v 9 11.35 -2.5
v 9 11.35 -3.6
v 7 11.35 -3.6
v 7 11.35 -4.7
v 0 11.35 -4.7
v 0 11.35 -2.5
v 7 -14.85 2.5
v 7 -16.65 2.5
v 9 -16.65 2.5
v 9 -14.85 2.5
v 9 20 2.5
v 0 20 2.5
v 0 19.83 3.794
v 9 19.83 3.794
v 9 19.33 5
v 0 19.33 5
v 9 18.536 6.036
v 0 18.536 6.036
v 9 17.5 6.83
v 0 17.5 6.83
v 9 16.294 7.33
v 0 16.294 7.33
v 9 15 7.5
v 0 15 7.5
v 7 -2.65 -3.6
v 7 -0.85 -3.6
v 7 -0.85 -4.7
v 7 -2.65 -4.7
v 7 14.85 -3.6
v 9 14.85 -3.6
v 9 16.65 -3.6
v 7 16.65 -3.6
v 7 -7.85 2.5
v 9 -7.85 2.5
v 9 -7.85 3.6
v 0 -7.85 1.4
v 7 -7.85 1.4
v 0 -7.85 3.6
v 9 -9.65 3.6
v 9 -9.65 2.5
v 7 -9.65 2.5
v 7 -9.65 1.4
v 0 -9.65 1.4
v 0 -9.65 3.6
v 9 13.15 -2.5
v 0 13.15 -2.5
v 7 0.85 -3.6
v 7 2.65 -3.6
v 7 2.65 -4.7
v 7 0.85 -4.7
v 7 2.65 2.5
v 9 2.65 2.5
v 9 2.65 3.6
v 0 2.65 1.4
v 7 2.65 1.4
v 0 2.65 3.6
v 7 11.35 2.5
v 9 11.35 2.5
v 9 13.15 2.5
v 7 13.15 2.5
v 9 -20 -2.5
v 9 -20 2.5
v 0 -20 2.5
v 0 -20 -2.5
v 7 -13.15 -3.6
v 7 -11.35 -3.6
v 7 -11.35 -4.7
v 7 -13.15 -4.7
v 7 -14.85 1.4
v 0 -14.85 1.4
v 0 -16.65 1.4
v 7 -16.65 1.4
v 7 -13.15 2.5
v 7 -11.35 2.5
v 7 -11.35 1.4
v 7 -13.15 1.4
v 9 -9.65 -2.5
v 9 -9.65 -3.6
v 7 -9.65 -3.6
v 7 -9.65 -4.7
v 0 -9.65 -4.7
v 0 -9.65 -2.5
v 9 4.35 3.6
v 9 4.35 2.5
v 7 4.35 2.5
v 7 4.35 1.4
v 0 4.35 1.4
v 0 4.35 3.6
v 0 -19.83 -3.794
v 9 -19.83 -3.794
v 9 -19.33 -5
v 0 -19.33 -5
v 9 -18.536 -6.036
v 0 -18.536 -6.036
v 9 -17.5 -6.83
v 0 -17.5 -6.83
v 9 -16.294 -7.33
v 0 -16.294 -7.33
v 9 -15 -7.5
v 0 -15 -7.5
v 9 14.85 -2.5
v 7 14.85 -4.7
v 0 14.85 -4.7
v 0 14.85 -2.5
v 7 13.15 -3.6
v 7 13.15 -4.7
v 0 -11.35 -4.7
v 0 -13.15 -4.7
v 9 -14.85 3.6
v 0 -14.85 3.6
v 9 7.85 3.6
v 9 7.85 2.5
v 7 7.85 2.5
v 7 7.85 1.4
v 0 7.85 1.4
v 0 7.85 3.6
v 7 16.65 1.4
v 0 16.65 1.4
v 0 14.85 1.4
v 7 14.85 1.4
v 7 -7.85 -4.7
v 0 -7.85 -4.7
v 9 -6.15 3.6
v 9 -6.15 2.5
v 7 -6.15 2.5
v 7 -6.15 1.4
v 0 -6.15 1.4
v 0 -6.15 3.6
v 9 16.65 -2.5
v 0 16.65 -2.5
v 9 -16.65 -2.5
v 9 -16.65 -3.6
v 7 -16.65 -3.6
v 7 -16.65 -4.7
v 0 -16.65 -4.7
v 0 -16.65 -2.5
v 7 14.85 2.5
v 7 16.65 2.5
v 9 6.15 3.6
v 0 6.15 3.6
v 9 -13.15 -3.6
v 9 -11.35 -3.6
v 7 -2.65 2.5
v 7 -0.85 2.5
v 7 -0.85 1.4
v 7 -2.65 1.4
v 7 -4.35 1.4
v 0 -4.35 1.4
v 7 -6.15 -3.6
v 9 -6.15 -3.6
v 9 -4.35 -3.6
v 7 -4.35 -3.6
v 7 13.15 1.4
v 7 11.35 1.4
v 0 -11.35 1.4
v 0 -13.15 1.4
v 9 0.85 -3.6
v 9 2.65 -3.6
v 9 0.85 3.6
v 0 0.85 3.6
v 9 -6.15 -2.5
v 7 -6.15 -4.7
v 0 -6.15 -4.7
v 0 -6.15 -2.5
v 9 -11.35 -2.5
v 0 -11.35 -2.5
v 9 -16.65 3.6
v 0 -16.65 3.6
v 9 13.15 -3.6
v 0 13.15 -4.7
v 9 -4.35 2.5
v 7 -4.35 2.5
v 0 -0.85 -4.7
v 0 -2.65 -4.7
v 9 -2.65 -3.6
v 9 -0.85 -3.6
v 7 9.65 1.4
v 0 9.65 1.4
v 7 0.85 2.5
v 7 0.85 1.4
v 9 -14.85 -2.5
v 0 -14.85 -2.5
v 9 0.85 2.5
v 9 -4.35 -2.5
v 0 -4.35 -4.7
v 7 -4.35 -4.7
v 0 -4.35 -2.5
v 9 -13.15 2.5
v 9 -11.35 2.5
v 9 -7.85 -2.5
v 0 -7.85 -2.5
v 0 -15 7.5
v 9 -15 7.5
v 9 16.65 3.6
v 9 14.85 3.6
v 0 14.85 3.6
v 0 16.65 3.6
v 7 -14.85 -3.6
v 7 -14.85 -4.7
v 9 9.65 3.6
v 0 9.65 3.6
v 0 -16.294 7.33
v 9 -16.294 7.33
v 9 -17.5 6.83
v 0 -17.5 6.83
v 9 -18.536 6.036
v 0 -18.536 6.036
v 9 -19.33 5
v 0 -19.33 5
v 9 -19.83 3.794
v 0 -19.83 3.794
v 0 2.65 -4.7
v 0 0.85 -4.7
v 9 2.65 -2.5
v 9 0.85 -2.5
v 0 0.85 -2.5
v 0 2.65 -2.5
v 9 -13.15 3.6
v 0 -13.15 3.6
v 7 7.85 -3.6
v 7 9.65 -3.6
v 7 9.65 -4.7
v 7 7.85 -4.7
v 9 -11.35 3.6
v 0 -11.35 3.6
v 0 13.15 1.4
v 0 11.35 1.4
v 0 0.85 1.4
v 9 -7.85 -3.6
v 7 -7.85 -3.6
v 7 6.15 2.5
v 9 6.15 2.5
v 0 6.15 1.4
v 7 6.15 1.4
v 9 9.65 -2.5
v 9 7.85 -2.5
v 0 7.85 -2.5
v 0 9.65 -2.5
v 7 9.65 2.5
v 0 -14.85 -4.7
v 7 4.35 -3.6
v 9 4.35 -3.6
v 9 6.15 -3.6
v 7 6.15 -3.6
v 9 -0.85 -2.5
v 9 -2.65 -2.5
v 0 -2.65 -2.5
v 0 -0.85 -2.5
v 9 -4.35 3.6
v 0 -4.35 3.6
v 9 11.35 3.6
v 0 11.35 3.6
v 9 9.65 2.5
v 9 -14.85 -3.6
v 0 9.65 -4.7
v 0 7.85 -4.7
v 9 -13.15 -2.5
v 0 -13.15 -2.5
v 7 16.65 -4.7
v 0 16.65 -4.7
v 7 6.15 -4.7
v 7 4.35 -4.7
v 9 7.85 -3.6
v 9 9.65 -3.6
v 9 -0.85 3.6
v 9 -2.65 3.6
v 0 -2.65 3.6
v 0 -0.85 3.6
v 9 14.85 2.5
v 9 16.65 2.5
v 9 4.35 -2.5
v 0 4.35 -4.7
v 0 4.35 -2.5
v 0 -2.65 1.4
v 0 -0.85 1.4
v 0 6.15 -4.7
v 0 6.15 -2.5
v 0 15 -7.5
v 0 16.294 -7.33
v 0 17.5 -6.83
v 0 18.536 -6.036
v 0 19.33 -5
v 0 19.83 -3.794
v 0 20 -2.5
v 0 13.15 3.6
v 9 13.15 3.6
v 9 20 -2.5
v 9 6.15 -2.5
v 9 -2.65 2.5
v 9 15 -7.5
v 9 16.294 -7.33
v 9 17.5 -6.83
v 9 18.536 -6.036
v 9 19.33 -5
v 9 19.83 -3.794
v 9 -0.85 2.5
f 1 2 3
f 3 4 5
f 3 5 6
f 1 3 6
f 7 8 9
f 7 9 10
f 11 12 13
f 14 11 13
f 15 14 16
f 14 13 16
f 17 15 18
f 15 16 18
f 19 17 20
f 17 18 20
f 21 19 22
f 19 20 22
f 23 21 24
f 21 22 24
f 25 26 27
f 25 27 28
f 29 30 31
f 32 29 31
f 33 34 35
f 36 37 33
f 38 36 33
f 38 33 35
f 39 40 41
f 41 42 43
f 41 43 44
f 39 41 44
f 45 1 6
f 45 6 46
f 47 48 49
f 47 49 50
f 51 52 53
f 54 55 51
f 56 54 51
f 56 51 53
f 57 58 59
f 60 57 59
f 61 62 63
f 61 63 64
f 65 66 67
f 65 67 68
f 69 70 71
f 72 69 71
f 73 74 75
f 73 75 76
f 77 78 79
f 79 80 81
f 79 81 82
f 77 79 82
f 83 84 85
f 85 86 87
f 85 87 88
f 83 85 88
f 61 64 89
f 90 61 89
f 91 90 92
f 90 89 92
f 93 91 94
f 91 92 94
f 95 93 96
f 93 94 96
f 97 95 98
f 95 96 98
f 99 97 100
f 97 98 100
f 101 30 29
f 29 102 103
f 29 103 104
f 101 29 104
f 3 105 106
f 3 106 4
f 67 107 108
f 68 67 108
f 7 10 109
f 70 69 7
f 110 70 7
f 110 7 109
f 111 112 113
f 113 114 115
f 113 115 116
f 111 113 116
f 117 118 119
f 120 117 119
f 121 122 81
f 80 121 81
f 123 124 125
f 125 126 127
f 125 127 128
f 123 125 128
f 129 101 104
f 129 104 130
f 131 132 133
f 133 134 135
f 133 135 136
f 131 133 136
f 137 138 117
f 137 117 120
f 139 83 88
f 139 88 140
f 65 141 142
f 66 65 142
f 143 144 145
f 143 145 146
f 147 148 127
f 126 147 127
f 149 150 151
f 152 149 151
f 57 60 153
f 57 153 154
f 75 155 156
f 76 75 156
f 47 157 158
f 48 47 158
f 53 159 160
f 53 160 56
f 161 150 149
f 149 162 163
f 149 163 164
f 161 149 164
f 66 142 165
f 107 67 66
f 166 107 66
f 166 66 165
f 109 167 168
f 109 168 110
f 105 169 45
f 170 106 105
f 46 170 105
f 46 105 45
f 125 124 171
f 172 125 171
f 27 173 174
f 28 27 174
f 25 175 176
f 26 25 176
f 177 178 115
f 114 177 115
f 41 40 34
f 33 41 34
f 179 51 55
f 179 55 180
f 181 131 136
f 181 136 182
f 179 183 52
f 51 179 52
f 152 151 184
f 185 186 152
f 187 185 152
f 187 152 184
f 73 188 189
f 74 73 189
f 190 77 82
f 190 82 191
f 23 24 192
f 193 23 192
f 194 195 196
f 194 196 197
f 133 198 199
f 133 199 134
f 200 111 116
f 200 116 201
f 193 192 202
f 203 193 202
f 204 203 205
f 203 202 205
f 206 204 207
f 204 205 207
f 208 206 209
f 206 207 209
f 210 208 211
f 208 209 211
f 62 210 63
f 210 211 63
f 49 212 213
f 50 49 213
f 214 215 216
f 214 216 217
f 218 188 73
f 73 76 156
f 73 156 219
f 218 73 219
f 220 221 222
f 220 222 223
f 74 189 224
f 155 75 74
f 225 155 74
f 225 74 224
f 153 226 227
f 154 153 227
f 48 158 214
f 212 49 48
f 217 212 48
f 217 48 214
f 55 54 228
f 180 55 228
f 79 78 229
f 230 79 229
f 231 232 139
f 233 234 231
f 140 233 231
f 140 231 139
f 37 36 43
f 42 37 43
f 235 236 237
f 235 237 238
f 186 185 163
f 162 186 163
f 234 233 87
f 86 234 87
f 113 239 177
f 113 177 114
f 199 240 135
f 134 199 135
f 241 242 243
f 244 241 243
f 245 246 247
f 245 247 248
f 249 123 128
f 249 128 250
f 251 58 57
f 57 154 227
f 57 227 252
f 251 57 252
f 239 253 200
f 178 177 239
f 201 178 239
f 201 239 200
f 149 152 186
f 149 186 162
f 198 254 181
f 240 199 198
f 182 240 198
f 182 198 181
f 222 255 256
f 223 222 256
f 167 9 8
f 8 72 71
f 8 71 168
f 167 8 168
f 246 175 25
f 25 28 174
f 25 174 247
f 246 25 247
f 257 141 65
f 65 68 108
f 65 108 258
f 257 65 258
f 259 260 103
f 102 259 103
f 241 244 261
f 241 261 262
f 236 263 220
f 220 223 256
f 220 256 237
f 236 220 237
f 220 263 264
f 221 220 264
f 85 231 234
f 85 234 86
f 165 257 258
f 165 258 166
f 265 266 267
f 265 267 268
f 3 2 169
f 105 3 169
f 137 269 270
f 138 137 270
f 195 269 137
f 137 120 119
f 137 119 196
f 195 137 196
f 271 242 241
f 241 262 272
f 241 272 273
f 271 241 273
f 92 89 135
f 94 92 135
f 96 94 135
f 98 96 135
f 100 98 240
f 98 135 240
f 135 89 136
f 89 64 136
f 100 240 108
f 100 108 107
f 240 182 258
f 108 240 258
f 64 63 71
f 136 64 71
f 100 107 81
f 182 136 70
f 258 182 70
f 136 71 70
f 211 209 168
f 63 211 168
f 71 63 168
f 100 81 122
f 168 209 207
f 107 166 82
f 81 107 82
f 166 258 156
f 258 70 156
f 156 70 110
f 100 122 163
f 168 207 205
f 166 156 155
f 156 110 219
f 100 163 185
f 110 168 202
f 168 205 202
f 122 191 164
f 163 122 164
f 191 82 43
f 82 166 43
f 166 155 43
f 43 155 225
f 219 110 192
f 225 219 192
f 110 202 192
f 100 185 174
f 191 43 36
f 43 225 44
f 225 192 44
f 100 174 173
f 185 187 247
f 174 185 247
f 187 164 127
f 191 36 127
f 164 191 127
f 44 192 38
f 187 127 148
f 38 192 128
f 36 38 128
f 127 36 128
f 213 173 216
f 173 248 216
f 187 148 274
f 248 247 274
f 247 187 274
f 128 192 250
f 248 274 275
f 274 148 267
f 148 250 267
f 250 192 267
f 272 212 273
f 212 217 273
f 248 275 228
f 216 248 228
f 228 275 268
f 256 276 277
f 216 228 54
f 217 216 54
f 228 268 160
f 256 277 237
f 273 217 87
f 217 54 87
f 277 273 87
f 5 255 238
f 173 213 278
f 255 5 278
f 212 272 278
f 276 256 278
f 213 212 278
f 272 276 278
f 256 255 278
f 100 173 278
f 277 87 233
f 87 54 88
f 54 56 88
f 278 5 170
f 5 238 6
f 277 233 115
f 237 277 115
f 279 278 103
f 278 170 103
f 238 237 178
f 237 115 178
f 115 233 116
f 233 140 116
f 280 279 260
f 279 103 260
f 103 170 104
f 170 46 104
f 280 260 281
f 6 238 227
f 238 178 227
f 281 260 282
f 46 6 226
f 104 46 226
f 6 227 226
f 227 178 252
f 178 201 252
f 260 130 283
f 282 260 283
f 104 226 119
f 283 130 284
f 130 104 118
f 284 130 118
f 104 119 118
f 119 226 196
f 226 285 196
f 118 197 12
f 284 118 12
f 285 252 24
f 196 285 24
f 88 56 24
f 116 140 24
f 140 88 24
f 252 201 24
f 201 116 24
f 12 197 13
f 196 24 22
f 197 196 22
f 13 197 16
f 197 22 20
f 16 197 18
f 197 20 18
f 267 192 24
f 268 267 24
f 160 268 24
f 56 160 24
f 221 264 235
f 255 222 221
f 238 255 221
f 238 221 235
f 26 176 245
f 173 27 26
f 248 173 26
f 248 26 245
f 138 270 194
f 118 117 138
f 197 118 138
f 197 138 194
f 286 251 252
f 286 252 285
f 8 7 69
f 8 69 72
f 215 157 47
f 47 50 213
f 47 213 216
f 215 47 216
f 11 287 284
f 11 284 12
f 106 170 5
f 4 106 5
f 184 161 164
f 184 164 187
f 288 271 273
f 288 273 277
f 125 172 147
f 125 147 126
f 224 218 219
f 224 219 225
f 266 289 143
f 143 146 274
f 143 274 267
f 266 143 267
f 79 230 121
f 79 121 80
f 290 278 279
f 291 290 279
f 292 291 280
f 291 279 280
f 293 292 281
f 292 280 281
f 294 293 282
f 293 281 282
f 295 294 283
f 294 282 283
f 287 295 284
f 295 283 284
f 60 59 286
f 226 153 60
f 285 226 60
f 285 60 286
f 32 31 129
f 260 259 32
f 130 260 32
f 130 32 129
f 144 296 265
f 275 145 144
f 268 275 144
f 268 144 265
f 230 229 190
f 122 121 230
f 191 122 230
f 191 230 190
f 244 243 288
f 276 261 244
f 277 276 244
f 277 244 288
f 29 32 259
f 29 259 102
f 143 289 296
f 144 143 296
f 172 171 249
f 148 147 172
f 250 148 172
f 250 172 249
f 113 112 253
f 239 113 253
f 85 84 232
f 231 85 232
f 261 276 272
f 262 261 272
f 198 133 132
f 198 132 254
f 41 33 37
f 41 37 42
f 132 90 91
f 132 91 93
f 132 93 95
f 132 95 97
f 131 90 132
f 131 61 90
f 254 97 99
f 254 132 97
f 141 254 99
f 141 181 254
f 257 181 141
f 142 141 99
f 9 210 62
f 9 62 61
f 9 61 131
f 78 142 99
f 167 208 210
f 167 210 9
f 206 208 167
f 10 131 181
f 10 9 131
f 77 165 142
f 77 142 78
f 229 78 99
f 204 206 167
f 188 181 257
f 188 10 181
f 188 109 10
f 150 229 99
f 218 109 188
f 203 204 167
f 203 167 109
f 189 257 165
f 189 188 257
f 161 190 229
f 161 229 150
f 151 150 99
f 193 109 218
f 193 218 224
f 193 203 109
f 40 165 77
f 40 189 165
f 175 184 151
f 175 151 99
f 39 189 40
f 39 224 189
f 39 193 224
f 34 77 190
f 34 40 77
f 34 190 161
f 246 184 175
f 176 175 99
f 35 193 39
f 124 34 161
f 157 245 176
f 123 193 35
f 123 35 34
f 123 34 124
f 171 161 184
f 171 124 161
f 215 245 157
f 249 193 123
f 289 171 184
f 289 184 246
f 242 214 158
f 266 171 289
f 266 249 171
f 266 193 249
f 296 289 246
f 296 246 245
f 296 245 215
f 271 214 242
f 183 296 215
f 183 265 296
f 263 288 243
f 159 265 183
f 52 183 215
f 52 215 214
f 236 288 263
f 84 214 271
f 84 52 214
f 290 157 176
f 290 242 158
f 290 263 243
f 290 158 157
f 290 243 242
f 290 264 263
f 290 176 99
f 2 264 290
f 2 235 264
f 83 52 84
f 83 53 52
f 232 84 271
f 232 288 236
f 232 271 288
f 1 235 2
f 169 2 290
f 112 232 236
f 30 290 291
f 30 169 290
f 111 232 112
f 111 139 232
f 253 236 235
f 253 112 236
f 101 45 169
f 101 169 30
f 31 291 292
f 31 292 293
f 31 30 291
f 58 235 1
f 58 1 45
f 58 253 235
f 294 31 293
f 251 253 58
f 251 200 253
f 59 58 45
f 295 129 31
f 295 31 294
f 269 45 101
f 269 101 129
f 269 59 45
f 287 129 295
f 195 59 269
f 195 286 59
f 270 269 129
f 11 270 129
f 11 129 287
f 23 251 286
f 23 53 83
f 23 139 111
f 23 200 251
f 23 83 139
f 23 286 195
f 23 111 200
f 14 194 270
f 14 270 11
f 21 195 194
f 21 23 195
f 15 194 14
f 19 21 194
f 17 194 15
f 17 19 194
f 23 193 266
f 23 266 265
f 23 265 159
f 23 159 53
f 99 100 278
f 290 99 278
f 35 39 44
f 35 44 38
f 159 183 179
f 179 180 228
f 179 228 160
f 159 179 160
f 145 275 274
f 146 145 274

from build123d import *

# Parameters (mm, degrees)
BOSS_EXTRUDE1_DEPTH = 9
SKETCH2_W           = 1.8
SKETCH2_H           = 1.1
CUT_EXTRUDE1_DEPTH  = 24.178653973
SKETCH3_W           = 1.8
SKETCH3_H           = 1.1
CUT_EXTRUDE2_DEPTH  = 7


with BuildPart() as part:
    # Sketch1 → Boss-Extrude1 (new body)
    with BuildSketch(Plane.YZ):
        with BuildLine():
            Line((-15, -7.5), (15, -7.5))
            ThreePointArc((15, -7.5), (18.535533906, -6.035533906), (20, -2.5))
            Line((20, -2.5), (20, 2.5))
            ThreePointArc((20, 2.5), (18.535533906, 6.035533906), (15, 7.5))
            Line((15, 7.5), (-15, 7.5))
            ThreePointArc((-15, 7.5), (-18.535533906, 6.035533906), (-20, 2.5))
            Line((-20, 2.5), (-20, -2.5))
            ThreePointArc((-20, -2.5), (-18.535533906, -6.035533906), (-15, -7.5))
        make_face()
    extrude(amount=BOSS_EXTRUDE1_DEPTH)

    # Sketch2 → Cut-Extrude1 (cut, through all)
    with BuildSketch(Plane.YZ.offset(9)):
        with Locations((-12.25, 3.05)):
            Rectangle(SKETCH2_W, SKETCH2_H)
        with Locations((-15.75, 3.05)):
            Rectangle(SKETCH2_W, SKETCH2_H)
        with Locations((-8.75, 3.05)):
            Rectangle(SKETCH2_W, SKETCH2_H)
        with Locations((-5.25, 3.05)):
            Rectangle(SKETCH2_W, SKETCH2_H)
        with Locations((-1.75, 3.05)):
            Rectangle(SKETCH2_W, SKETCH2_H)
        with Locations((1.75, 3.05)):
            Rectangle(SKETCH2_W, SKETCH2_H)
        with Locations((5.25, 3.05)):
            Rectangle(SKETCH2_W, SKETCH2_H)
        with Locations((8.75, 3.05)):
            Rectangle(SKETCH2_W, SKETCH2_H)
        with Locations((12.25, 3.05)):
            Rectangle(SKETCH2_W, SKETCH2_H)
        with Locations((15.75, 3.05)):
            Rectangle(SKETCH2_W, SKETCH2_H)
        with Locations((-12.25, -3.05)):
            Rectangle(SKETCH2_W, SKETCH2_H)
        with Locations((-8.75, -3.05)):
            Rectangle(SKETCH2_W, SKETCH2_H)
        with Locations((-5.25, -3.05)):
            Rectangle(SKETCH2_W, SKETCH2_H)
        with Locations((-1.75, -3.05)):
            Rectangle(SKETCH2_W, SKETCH2_H)
        with Locations((1.75, -3.05)):
            Rectangle(SKETCH2_W, SKETCH2_H)
        with Locations((5.25, -3.05)):
            Rectangle(SKETCH2_W, SKETCH2_H)
        with Locations((8.75, -3.05)):
            Rectangle(SKETCH2_W, SKETCH2_H)
        with Locations((12.25, -3.05)):
            Rectangle(SKETCH2_W, SKETCH2_H)
        with Locations((15.75, -3.05)):
            Rectangle(SKETCH2_W, SKETCH2_H)
        with Locations((-15.75, -3.05)):
            Rectangle(SKETCH2_W, SKETCH2_H)
    extrude(amount=-CUT_EXTRUDE1_DEPTH, mode=Mode.SUBTRACT)

    # Sketch3 → Cut-Extrude2 (cut)
    with BuildSketch(Plane(origin=(0, 0, 0), x_dir=(0, -1, 0), z_dir=(-1, 0, 0))):
        with Locations((-15.75, 1.95)):
            Rectangle(SKETCH3_W, SKETCH3_H)
        with Locations((-12.25, 1.95)):
            Rectangle(SKETCH3_W, SKETCH3_H)
        with Locations((-8.75, 1.95)):
            Rectangle(SKETCH3_W, SKETCH3_H)
        with Locations((-5.25, 1.95)):
            Rectangle(SKETCH3_W, SKETCH3_H)
        with Locations((-1.75, 1.95)):
            Rectangle(SKETCH3_W, SKETCH3_H)
        with Locations((1.75, 1.95)):
            Rectangle(SKETCH3_W, SKETCH3_H)
        with Locations((5.25, 1.95)):
            Rectangle(SKETCH3_W, SKETCH3_H)
        with Locations((8.75, 1.95)):
            Rectangle(SKETCH3_W, SKETCH3_H)
        with Locations((12.25, 1.95)):
            Rectangle(SKETCH3_W, SKETCH3_H)
        with Locations((15.75, 1.95)):
            Rectangle(SKETCH3_W, SKETCH3_H)
        with Locations((-15.75, -4.15)):
            Rectangle(SKETCH3_W, SKETCH3_H)
        with Locations((-12.25, -4.15)):
            Rectangle(SKETCH3_W, SKETCH3_H)
        with Locations((-8.75, -4.15)):
            Rectangle(SKETCH3_W, SKETCH3_H)
        with Locations((-5.25, -4.15)):
            Rectangle(SKETCH3_W, SKETCH3_H)
        with Locations((-1.75, -4.15)):
            Rectangle(SKETCH3_W, SKETCH3_H)
        with Locations((1.75, -4.15)):
            Rectangle(SKETCH3_W, SKETCH3_H)
        with Locations((5.25, -4.15)):
            Rectangle(SKETCH3_W, SKETCH3_H)
        with Locations((8.75, -4.15)):
            Rectangle(SKETCH3_W, SKETCH3_H)
        with Locations((12.25, -4.15)):
            Rectangle(SKETCH3_W, SKETCH3_H)
        with Locations((15.75, -4.15)):
            Rectangle(SKETCH3_W, SKETCH3_H)
    extrude(amount=-CUT_EXTRUDE2_DEPTH, mode=Mode.SUBTRACT)


solid = part.part
